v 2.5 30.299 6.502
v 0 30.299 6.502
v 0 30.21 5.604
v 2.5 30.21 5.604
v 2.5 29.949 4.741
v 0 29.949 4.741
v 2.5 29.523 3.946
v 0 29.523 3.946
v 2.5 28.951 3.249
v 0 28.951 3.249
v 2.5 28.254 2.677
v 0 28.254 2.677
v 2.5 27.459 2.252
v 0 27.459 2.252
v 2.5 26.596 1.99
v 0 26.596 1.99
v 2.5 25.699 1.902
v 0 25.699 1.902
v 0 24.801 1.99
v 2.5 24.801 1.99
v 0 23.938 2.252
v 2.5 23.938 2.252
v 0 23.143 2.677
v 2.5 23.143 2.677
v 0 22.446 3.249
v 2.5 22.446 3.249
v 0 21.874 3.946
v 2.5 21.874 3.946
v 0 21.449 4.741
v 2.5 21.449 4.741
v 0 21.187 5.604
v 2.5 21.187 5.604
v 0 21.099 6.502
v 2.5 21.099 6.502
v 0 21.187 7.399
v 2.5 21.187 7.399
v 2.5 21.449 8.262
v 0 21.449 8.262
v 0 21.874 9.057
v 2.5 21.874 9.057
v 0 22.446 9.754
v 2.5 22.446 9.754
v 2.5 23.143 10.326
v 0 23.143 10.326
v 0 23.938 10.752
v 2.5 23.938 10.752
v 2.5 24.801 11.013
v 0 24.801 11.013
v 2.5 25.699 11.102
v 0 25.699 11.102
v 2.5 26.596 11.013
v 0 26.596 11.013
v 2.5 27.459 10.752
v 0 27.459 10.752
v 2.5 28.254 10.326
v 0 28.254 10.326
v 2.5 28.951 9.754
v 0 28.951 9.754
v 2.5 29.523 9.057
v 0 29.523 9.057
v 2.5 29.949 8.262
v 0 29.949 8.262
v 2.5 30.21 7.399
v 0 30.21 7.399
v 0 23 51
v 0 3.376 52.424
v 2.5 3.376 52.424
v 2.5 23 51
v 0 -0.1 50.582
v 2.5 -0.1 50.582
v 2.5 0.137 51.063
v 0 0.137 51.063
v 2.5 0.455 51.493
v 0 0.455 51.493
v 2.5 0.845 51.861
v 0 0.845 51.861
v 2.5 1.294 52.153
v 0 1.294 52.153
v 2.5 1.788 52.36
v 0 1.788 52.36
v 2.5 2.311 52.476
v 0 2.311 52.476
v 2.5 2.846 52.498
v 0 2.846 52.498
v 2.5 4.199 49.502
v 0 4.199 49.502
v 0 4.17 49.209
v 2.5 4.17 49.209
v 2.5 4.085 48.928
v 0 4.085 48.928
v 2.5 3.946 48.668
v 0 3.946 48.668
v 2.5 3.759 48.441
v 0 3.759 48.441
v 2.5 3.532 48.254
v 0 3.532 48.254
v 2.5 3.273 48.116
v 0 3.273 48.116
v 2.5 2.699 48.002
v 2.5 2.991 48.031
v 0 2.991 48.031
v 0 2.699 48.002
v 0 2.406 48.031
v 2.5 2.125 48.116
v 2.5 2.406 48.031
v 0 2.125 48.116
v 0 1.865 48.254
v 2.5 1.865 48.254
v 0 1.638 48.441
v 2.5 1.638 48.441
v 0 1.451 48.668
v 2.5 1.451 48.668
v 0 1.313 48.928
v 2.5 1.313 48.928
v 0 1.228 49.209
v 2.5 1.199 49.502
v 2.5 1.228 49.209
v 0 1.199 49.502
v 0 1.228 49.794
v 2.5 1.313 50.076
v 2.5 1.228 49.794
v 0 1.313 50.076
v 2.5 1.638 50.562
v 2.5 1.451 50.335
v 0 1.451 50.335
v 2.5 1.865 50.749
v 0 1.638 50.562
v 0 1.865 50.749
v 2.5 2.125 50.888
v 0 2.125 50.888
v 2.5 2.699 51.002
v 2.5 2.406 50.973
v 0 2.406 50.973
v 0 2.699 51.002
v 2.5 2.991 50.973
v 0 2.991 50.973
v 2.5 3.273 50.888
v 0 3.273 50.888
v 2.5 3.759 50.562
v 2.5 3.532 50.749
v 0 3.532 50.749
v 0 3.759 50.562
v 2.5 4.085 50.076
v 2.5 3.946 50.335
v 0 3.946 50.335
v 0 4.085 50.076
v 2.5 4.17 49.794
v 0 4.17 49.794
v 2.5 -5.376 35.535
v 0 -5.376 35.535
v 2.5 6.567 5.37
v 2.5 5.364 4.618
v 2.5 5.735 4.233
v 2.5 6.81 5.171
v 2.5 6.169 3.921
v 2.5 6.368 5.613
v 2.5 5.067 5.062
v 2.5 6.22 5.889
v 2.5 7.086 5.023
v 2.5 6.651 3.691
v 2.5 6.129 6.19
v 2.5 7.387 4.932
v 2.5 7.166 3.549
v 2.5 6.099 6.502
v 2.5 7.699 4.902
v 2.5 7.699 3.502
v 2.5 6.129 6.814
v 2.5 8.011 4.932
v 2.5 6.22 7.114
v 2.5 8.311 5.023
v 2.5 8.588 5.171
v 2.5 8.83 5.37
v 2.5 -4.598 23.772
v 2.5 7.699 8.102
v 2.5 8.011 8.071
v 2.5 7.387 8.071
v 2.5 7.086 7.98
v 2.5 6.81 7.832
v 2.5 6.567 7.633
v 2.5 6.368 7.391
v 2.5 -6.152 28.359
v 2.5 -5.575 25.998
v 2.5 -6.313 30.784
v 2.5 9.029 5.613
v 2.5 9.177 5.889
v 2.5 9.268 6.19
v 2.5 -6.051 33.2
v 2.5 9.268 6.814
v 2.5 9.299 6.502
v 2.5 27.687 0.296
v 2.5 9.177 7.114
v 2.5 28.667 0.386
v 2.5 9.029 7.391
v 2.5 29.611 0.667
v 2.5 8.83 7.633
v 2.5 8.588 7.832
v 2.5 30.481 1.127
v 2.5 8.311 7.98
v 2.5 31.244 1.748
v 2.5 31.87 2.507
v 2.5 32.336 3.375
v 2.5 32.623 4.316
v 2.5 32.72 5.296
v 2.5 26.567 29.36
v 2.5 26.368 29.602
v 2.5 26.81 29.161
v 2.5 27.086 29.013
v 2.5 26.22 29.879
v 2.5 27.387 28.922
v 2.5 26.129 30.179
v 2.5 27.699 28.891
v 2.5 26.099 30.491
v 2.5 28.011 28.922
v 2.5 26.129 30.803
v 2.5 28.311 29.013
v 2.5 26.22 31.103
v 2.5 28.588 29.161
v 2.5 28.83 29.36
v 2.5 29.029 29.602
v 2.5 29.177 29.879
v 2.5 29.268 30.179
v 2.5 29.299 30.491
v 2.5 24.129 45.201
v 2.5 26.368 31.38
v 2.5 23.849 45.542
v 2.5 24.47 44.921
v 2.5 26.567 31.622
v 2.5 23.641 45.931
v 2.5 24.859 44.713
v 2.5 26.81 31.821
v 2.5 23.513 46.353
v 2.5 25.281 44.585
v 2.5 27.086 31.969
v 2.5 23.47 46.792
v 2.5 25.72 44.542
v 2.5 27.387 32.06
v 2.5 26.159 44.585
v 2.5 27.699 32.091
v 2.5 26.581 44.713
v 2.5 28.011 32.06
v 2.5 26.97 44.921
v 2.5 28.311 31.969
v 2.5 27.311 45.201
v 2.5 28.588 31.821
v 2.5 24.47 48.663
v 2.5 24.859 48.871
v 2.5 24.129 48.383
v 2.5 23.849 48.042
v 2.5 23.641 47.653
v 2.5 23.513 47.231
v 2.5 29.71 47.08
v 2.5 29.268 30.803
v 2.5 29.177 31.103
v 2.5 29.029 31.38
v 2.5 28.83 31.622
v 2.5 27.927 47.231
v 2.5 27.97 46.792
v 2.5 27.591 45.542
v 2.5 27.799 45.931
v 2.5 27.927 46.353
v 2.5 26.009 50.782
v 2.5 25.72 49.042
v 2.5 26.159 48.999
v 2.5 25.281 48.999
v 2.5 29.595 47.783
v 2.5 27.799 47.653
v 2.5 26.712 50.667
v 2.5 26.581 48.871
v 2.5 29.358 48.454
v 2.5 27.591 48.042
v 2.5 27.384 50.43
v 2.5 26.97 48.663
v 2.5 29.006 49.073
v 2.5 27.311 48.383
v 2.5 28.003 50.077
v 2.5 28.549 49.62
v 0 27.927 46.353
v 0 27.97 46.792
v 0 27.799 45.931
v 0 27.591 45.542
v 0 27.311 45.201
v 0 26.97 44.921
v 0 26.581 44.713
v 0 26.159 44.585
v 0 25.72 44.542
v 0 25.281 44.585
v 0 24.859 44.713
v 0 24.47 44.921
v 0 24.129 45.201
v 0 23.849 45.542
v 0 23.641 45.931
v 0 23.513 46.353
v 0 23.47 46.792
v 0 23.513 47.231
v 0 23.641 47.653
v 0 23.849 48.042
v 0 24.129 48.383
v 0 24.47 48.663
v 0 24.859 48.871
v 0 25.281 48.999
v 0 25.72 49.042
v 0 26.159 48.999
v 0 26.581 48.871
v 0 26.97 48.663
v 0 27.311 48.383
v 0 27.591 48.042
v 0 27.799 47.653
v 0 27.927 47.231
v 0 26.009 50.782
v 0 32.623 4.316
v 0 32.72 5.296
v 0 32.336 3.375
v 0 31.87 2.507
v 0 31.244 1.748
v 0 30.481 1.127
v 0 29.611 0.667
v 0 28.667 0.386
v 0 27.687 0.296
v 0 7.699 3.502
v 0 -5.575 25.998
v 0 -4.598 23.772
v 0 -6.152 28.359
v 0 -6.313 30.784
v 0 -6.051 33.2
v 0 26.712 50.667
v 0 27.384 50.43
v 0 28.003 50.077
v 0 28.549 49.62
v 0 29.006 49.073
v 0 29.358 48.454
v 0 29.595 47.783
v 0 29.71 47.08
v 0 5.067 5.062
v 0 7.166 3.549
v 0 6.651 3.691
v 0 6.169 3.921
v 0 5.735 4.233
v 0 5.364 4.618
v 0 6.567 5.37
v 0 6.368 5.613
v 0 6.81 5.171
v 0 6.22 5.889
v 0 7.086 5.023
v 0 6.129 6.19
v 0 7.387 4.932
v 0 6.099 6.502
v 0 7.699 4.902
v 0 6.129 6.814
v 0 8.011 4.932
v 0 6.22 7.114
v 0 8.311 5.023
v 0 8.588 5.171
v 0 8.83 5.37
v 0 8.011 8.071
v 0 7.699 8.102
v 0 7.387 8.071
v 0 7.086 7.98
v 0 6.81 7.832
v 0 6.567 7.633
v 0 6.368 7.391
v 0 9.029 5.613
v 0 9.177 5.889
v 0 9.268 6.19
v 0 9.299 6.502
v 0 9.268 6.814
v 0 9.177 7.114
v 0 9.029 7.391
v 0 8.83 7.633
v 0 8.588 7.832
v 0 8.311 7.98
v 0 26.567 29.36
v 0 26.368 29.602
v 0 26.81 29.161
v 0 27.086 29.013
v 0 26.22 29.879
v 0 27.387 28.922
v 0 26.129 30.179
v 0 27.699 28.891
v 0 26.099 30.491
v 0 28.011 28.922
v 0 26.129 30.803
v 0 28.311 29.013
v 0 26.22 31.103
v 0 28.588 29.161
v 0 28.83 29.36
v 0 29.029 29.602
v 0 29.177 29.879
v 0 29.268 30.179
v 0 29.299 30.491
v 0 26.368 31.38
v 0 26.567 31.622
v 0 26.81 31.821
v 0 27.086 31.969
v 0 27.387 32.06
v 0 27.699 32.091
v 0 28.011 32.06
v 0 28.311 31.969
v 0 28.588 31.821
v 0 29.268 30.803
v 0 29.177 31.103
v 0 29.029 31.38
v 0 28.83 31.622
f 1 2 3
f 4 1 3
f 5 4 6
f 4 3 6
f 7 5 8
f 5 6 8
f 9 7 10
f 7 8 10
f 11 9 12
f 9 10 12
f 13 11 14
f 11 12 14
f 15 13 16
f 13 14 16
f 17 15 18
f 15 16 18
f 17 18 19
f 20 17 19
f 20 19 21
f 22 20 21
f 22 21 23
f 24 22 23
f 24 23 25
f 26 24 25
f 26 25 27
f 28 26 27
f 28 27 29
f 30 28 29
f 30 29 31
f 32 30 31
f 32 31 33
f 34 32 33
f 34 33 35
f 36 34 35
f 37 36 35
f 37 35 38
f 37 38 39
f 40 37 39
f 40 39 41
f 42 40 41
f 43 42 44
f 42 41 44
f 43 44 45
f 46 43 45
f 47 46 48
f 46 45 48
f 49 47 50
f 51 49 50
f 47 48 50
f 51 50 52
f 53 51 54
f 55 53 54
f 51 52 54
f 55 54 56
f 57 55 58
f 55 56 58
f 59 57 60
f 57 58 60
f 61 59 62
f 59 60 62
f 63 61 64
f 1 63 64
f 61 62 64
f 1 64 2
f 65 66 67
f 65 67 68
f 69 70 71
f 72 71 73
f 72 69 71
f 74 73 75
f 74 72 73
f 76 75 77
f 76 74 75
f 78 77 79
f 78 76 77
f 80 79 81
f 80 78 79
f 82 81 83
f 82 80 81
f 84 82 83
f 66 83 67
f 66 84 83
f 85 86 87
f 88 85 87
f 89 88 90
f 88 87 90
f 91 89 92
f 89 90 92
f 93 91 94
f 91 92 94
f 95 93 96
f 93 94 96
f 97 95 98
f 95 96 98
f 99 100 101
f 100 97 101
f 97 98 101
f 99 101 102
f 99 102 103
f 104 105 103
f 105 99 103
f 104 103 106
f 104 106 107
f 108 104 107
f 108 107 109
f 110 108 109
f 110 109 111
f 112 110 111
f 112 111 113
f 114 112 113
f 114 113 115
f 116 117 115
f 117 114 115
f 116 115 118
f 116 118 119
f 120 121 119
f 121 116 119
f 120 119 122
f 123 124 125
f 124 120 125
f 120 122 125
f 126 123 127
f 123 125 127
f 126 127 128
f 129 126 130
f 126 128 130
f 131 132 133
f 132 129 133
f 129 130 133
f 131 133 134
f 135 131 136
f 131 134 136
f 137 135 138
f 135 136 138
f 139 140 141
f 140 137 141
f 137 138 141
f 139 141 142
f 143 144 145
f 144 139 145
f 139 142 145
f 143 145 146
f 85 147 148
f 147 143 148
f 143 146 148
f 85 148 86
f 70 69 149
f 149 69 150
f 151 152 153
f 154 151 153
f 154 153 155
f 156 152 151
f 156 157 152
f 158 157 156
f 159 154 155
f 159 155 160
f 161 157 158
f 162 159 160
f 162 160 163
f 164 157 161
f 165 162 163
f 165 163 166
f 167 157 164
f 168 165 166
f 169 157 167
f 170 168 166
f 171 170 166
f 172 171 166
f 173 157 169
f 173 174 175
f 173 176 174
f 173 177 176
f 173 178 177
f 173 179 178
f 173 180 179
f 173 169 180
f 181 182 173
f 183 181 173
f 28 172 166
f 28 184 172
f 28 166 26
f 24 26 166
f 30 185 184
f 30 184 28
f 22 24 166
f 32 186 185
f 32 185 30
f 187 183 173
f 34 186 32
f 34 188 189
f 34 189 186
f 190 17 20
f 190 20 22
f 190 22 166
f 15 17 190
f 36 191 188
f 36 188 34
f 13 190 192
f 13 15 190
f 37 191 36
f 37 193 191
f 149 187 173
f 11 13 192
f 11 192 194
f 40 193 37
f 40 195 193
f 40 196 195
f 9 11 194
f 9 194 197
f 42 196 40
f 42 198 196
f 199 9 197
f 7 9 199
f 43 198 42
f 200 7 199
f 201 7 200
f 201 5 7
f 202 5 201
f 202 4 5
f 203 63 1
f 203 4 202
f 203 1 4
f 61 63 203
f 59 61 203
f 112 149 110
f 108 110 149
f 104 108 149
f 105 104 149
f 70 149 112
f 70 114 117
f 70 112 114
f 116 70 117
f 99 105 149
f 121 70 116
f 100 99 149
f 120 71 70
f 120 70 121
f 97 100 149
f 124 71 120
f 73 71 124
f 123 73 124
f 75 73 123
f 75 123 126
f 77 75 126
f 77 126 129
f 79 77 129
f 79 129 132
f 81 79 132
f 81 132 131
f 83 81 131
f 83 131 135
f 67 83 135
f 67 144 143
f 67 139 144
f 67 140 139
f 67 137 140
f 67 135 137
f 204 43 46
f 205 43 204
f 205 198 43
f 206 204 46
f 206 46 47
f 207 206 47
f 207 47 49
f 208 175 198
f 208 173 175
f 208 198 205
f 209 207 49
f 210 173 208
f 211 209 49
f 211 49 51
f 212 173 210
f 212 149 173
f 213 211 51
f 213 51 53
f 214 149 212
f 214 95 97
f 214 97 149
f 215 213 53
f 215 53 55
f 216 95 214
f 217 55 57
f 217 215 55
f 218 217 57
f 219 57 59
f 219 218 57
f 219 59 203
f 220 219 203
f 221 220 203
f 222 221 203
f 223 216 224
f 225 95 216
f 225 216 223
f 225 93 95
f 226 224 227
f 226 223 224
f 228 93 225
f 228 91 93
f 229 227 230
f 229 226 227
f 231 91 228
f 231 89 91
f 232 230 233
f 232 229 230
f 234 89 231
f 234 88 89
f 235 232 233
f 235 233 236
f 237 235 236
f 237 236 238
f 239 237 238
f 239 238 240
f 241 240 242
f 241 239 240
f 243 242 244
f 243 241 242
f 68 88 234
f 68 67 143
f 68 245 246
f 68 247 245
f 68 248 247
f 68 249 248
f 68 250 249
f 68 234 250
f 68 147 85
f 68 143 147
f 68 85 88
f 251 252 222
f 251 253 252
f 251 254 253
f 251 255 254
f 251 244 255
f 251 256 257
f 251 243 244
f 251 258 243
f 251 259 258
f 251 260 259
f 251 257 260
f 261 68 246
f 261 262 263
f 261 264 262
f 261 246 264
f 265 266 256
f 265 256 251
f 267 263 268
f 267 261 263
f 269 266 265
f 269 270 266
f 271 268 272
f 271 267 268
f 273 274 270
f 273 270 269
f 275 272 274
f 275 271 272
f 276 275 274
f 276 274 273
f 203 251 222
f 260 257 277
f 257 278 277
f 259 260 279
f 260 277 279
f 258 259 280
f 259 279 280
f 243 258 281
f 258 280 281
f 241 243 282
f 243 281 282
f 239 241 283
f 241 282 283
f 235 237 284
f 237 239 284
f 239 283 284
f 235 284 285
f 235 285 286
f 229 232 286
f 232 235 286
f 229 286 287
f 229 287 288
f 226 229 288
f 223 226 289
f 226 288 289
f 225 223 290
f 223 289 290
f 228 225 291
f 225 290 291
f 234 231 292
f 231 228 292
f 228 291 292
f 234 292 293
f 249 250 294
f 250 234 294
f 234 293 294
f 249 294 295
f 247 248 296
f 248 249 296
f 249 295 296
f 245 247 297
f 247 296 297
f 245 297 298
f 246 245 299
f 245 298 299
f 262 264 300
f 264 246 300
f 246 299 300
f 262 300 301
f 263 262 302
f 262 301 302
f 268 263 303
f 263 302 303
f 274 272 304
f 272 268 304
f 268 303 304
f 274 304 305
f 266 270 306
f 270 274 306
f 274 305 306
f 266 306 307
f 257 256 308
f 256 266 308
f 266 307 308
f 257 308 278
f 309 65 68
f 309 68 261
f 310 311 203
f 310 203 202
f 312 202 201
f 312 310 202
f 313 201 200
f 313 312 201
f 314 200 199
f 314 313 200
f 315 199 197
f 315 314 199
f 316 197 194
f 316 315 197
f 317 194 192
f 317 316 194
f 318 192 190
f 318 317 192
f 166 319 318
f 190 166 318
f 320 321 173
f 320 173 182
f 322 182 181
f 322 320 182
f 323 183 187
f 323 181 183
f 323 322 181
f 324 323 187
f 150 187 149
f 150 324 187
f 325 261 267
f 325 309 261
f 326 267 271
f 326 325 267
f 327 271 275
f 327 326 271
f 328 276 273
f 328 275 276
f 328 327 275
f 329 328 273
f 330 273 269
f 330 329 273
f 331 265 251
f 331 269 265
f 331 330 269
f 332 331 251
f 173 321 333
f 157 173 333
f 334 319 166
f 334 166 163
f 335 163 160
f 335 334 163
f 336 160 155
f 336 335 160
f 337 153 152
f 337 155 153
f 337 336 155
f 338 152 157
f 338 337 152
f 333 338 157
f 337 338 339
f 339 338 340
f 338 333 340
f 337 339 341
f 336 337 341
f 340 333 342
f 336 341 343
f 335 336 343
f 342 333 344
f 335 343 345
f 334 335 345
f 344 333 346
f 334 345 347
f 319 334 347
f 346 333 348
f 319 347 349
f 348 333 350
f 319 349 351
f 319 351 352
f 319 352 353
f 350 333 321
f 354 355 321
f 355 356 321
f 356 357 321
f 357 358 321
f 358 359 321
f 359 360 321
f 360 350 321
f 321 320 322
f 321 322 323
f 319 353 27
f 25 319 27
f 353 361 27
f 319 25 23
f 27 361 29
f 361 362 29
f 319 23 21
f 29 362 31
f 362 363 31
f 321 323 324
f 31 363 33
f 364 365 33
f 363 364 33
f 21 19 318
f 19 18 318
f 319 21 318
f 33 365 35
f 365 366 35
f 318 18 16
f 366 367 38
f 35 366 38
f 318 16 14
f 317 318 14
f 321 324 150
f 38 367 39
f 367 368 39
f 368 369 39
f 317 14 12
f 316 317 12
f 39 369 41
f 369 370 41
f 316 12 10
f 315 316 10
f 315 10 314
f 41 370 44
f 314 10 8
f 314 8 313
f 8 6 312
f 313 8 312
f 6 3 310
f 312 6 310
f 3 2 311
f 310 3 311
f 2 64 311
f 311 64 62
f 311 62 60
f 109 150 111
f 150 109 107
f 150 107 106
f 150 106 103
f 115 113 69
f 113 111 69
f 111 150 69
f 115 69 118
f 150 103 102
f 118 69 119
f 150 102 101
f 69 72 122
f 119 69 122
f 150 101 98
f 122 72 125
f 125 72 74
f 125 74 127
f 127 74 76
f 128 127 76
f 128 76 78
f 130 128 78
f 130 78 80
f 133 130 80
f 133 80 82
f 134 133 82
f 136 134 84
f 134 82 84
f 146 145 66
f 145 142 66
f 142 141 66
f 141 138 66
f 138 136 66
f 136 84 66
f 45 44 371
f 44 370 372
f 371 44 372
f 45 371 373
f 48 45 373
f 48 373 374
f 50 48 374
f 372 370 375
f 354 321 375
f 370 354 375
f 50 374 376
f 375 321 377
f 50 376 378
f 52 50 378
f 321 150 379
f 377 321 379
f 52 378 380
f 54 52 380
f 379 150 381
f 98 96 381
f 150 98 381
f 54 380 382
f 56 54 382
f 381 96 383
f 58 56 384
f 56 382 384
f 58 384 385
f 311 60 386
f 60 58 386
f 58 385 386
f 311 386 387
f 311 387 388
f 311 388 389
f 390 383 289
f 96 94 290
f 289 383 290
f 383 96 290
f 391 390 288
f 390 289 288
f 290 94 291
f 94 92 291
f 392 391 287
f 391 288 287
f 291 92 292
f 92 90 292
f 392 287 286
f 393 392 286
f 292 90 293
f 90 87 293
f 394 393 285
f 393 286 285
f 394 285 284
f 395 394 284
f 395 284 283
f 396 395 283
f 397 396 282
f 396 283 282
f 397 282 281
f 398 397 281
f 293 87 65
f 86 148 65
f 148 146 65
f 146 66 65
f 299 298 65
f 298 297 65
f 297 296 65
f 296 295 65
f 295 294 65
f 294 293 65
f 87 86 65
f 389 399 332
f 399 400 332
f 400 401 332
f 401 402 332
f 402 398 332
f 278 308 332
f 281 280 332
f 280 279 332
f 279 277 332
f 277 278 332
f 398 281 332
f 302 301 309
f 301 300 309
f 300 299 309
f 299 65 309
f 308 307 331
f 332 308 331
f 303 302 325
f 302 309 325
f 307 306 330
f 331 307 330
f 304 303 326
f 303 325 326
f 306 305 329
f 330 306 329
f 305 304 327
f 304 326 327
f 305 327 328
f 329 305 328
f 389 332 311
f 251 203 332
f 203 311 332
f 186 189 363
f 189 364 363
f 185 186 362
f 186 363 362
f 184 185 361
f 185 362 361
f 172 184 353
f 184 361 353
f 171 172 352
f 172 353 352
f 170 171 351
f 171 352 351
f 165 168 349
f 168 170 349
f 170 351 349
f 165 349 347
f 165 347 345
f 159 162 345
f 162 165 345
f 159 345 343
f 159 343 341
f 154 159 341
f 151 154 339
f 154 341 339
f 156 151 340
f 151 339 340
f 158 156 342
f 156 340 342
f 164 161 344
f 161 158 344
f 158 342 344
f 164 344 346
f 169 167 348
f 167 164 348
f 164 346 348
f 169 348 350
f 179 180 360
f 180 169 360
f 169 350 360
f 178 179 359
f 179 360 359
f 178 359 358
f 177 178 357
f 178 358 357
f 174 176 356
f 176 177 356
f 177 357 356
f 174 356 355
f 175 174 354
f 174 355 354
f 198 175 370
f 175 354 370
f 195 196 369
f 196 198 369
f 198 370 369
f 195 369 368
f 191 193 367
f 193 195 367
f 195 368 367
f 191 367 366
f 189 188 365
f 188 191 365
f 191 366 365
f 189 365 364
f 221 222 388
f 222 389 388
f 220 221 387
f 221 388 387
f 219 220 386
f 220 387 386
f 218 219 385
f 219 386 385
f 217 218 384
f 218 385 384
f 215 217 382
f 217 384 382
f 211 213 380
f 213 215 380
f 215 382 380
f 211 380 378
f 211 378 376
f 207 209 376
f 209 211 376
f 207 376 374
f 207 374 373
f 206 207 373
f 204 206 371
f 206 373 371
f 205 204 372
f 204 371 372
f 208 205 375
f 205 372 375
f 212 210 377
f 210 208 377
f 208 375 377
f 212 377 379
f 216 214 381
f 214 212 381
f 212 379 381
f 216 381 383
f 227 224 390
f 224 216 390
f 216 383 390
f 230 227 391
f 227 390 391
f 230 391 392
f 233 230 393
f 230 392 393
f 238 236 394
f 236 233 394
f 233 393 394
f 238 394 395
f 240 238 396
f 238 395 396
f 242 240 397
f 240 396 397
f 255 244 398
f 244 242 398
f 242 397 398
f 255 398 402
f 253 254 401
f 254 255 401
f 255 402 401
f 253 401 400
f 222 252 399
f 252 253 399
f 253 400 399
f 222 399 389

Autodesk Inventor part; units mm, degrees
ref_plane "YZ Plane" through (0, 0, 0) normal (1, 0, 0) x (0, 1, 0)
ref_plane "XZ Plane" through (0, 0, 0) normal (0, 1, 0) x (-1, 0, 0)
ref_plane "XY Plane" through (0, 0, 0) normal (0, 0, 1) x (1, 0, 0)
sketch "Эскиз1" plane through (0, 0, 0) normal (1, 0, 0) x (0, 1, 0)
  circle A0 centre (25.7199, 46.7921) radius 2.25
  circle A1 centre (25.6987, 6.5017) radius 4.6
  circle A2 centre (7.6987, 6.5017) radius 1.6
  arc A3 (27.6873, 0.2956) -> (32.7199, 5.2955) centre (27.7199, 5.2955) ccw
  circle A4 centre (7.6843, 30.491) radius 14
  arc A5 (14.2267, 42.8683) -> (-1.4853, 19.9118) centre (7.6843, 30.491) ccw
  circle A6 centre (27.6987, 30.491) radius 1.6
  line L0 (7.6843, 30.491) -> (25.6987, 6.5017)
  circle A7 centre (2.6987, 49.5017) radius 1.5
  circle A8 centre (7.6987, 6.5017) radius 3
  line L1 (7.6987, 3.5017) -> (27.6873, 0.2956)
  circle A9 centre (2.6987, 49.5017) radius 3
  line L2 (-3.2958, 40.9198) -> (-5.3755, 35.5348)
  line L3 (-0.0999, 50.5825) -> (-5.3755, 35.5348)
  line L4 (-1.3769, 17.8835) -> (-4.5981, 23.7723)
  line L5 (-4.5981, 23.7723) -> (5.0667, 5.062)
  circle A10 centre (25.7199, 46.7921) radius 4
  line L6 (2.4504, 52.4914) -> (23, 51)
  line L7 (2.4504, 52.4914) -> (26.0094, 50.7816)
  line L8 (32.7199, 5.2955) -> (29.7095, 47.0795)
  point P0 (0, 0)
  point P1 (-2.3427, 0)
  point P2 (7.6843, 30.491)
  point P3 (7.6843, 30.491)
  point P4 (-4.5981, 23.7723)
  point P5 (-3.3371, 41.4181)
  point P6 (-5.3755, 35.5348)
  point P7 (5.0013, 5.1886)
  point P8 (-0.1621, 50.405)
  point P9 (3.376, 52.4242)
  dimension "d132" = 28
  dimension "d9" = 4.5
  dimension "d86" = 9.2
  dimension "d87" = 3.2
  dimension "d92" = 5
  dimension "d145" = 3.2
  dimension "d191" = 30
  dimension "d227" = 3
  dimension "d234" = 6
  dimension "d235" = 6
  dimension "d242" = 8
extrude "Выдавливание1" add sketch "Эскиз1" along normal blind 2.5 contours A8 | A4 L3 A9 L6 L7 A10 L8 A3 L1 A8 L5 | A4 | L6 A9 | A10
equation "\"Радиус_гибки\" = Толщина"
equation "\"Ширина_просечки\" = Толщина"
equation "\"Глубина_просечки\" = 0.5 * Толщина"
equation "\"Размер_просечки\" = 4 * Толщина"
equation "\"Мин_остаток\" = 2 * Толщина"
equation "\"Радиус_перехода\" = Радиус_гибки"
equation "\"Радиус_Якоби\" = Радиус_гибки"
equation "\"Размер_зазора\" = Толщина"
equation "\"Толщина\" = 3.048"
properties part number "drib_lef"
